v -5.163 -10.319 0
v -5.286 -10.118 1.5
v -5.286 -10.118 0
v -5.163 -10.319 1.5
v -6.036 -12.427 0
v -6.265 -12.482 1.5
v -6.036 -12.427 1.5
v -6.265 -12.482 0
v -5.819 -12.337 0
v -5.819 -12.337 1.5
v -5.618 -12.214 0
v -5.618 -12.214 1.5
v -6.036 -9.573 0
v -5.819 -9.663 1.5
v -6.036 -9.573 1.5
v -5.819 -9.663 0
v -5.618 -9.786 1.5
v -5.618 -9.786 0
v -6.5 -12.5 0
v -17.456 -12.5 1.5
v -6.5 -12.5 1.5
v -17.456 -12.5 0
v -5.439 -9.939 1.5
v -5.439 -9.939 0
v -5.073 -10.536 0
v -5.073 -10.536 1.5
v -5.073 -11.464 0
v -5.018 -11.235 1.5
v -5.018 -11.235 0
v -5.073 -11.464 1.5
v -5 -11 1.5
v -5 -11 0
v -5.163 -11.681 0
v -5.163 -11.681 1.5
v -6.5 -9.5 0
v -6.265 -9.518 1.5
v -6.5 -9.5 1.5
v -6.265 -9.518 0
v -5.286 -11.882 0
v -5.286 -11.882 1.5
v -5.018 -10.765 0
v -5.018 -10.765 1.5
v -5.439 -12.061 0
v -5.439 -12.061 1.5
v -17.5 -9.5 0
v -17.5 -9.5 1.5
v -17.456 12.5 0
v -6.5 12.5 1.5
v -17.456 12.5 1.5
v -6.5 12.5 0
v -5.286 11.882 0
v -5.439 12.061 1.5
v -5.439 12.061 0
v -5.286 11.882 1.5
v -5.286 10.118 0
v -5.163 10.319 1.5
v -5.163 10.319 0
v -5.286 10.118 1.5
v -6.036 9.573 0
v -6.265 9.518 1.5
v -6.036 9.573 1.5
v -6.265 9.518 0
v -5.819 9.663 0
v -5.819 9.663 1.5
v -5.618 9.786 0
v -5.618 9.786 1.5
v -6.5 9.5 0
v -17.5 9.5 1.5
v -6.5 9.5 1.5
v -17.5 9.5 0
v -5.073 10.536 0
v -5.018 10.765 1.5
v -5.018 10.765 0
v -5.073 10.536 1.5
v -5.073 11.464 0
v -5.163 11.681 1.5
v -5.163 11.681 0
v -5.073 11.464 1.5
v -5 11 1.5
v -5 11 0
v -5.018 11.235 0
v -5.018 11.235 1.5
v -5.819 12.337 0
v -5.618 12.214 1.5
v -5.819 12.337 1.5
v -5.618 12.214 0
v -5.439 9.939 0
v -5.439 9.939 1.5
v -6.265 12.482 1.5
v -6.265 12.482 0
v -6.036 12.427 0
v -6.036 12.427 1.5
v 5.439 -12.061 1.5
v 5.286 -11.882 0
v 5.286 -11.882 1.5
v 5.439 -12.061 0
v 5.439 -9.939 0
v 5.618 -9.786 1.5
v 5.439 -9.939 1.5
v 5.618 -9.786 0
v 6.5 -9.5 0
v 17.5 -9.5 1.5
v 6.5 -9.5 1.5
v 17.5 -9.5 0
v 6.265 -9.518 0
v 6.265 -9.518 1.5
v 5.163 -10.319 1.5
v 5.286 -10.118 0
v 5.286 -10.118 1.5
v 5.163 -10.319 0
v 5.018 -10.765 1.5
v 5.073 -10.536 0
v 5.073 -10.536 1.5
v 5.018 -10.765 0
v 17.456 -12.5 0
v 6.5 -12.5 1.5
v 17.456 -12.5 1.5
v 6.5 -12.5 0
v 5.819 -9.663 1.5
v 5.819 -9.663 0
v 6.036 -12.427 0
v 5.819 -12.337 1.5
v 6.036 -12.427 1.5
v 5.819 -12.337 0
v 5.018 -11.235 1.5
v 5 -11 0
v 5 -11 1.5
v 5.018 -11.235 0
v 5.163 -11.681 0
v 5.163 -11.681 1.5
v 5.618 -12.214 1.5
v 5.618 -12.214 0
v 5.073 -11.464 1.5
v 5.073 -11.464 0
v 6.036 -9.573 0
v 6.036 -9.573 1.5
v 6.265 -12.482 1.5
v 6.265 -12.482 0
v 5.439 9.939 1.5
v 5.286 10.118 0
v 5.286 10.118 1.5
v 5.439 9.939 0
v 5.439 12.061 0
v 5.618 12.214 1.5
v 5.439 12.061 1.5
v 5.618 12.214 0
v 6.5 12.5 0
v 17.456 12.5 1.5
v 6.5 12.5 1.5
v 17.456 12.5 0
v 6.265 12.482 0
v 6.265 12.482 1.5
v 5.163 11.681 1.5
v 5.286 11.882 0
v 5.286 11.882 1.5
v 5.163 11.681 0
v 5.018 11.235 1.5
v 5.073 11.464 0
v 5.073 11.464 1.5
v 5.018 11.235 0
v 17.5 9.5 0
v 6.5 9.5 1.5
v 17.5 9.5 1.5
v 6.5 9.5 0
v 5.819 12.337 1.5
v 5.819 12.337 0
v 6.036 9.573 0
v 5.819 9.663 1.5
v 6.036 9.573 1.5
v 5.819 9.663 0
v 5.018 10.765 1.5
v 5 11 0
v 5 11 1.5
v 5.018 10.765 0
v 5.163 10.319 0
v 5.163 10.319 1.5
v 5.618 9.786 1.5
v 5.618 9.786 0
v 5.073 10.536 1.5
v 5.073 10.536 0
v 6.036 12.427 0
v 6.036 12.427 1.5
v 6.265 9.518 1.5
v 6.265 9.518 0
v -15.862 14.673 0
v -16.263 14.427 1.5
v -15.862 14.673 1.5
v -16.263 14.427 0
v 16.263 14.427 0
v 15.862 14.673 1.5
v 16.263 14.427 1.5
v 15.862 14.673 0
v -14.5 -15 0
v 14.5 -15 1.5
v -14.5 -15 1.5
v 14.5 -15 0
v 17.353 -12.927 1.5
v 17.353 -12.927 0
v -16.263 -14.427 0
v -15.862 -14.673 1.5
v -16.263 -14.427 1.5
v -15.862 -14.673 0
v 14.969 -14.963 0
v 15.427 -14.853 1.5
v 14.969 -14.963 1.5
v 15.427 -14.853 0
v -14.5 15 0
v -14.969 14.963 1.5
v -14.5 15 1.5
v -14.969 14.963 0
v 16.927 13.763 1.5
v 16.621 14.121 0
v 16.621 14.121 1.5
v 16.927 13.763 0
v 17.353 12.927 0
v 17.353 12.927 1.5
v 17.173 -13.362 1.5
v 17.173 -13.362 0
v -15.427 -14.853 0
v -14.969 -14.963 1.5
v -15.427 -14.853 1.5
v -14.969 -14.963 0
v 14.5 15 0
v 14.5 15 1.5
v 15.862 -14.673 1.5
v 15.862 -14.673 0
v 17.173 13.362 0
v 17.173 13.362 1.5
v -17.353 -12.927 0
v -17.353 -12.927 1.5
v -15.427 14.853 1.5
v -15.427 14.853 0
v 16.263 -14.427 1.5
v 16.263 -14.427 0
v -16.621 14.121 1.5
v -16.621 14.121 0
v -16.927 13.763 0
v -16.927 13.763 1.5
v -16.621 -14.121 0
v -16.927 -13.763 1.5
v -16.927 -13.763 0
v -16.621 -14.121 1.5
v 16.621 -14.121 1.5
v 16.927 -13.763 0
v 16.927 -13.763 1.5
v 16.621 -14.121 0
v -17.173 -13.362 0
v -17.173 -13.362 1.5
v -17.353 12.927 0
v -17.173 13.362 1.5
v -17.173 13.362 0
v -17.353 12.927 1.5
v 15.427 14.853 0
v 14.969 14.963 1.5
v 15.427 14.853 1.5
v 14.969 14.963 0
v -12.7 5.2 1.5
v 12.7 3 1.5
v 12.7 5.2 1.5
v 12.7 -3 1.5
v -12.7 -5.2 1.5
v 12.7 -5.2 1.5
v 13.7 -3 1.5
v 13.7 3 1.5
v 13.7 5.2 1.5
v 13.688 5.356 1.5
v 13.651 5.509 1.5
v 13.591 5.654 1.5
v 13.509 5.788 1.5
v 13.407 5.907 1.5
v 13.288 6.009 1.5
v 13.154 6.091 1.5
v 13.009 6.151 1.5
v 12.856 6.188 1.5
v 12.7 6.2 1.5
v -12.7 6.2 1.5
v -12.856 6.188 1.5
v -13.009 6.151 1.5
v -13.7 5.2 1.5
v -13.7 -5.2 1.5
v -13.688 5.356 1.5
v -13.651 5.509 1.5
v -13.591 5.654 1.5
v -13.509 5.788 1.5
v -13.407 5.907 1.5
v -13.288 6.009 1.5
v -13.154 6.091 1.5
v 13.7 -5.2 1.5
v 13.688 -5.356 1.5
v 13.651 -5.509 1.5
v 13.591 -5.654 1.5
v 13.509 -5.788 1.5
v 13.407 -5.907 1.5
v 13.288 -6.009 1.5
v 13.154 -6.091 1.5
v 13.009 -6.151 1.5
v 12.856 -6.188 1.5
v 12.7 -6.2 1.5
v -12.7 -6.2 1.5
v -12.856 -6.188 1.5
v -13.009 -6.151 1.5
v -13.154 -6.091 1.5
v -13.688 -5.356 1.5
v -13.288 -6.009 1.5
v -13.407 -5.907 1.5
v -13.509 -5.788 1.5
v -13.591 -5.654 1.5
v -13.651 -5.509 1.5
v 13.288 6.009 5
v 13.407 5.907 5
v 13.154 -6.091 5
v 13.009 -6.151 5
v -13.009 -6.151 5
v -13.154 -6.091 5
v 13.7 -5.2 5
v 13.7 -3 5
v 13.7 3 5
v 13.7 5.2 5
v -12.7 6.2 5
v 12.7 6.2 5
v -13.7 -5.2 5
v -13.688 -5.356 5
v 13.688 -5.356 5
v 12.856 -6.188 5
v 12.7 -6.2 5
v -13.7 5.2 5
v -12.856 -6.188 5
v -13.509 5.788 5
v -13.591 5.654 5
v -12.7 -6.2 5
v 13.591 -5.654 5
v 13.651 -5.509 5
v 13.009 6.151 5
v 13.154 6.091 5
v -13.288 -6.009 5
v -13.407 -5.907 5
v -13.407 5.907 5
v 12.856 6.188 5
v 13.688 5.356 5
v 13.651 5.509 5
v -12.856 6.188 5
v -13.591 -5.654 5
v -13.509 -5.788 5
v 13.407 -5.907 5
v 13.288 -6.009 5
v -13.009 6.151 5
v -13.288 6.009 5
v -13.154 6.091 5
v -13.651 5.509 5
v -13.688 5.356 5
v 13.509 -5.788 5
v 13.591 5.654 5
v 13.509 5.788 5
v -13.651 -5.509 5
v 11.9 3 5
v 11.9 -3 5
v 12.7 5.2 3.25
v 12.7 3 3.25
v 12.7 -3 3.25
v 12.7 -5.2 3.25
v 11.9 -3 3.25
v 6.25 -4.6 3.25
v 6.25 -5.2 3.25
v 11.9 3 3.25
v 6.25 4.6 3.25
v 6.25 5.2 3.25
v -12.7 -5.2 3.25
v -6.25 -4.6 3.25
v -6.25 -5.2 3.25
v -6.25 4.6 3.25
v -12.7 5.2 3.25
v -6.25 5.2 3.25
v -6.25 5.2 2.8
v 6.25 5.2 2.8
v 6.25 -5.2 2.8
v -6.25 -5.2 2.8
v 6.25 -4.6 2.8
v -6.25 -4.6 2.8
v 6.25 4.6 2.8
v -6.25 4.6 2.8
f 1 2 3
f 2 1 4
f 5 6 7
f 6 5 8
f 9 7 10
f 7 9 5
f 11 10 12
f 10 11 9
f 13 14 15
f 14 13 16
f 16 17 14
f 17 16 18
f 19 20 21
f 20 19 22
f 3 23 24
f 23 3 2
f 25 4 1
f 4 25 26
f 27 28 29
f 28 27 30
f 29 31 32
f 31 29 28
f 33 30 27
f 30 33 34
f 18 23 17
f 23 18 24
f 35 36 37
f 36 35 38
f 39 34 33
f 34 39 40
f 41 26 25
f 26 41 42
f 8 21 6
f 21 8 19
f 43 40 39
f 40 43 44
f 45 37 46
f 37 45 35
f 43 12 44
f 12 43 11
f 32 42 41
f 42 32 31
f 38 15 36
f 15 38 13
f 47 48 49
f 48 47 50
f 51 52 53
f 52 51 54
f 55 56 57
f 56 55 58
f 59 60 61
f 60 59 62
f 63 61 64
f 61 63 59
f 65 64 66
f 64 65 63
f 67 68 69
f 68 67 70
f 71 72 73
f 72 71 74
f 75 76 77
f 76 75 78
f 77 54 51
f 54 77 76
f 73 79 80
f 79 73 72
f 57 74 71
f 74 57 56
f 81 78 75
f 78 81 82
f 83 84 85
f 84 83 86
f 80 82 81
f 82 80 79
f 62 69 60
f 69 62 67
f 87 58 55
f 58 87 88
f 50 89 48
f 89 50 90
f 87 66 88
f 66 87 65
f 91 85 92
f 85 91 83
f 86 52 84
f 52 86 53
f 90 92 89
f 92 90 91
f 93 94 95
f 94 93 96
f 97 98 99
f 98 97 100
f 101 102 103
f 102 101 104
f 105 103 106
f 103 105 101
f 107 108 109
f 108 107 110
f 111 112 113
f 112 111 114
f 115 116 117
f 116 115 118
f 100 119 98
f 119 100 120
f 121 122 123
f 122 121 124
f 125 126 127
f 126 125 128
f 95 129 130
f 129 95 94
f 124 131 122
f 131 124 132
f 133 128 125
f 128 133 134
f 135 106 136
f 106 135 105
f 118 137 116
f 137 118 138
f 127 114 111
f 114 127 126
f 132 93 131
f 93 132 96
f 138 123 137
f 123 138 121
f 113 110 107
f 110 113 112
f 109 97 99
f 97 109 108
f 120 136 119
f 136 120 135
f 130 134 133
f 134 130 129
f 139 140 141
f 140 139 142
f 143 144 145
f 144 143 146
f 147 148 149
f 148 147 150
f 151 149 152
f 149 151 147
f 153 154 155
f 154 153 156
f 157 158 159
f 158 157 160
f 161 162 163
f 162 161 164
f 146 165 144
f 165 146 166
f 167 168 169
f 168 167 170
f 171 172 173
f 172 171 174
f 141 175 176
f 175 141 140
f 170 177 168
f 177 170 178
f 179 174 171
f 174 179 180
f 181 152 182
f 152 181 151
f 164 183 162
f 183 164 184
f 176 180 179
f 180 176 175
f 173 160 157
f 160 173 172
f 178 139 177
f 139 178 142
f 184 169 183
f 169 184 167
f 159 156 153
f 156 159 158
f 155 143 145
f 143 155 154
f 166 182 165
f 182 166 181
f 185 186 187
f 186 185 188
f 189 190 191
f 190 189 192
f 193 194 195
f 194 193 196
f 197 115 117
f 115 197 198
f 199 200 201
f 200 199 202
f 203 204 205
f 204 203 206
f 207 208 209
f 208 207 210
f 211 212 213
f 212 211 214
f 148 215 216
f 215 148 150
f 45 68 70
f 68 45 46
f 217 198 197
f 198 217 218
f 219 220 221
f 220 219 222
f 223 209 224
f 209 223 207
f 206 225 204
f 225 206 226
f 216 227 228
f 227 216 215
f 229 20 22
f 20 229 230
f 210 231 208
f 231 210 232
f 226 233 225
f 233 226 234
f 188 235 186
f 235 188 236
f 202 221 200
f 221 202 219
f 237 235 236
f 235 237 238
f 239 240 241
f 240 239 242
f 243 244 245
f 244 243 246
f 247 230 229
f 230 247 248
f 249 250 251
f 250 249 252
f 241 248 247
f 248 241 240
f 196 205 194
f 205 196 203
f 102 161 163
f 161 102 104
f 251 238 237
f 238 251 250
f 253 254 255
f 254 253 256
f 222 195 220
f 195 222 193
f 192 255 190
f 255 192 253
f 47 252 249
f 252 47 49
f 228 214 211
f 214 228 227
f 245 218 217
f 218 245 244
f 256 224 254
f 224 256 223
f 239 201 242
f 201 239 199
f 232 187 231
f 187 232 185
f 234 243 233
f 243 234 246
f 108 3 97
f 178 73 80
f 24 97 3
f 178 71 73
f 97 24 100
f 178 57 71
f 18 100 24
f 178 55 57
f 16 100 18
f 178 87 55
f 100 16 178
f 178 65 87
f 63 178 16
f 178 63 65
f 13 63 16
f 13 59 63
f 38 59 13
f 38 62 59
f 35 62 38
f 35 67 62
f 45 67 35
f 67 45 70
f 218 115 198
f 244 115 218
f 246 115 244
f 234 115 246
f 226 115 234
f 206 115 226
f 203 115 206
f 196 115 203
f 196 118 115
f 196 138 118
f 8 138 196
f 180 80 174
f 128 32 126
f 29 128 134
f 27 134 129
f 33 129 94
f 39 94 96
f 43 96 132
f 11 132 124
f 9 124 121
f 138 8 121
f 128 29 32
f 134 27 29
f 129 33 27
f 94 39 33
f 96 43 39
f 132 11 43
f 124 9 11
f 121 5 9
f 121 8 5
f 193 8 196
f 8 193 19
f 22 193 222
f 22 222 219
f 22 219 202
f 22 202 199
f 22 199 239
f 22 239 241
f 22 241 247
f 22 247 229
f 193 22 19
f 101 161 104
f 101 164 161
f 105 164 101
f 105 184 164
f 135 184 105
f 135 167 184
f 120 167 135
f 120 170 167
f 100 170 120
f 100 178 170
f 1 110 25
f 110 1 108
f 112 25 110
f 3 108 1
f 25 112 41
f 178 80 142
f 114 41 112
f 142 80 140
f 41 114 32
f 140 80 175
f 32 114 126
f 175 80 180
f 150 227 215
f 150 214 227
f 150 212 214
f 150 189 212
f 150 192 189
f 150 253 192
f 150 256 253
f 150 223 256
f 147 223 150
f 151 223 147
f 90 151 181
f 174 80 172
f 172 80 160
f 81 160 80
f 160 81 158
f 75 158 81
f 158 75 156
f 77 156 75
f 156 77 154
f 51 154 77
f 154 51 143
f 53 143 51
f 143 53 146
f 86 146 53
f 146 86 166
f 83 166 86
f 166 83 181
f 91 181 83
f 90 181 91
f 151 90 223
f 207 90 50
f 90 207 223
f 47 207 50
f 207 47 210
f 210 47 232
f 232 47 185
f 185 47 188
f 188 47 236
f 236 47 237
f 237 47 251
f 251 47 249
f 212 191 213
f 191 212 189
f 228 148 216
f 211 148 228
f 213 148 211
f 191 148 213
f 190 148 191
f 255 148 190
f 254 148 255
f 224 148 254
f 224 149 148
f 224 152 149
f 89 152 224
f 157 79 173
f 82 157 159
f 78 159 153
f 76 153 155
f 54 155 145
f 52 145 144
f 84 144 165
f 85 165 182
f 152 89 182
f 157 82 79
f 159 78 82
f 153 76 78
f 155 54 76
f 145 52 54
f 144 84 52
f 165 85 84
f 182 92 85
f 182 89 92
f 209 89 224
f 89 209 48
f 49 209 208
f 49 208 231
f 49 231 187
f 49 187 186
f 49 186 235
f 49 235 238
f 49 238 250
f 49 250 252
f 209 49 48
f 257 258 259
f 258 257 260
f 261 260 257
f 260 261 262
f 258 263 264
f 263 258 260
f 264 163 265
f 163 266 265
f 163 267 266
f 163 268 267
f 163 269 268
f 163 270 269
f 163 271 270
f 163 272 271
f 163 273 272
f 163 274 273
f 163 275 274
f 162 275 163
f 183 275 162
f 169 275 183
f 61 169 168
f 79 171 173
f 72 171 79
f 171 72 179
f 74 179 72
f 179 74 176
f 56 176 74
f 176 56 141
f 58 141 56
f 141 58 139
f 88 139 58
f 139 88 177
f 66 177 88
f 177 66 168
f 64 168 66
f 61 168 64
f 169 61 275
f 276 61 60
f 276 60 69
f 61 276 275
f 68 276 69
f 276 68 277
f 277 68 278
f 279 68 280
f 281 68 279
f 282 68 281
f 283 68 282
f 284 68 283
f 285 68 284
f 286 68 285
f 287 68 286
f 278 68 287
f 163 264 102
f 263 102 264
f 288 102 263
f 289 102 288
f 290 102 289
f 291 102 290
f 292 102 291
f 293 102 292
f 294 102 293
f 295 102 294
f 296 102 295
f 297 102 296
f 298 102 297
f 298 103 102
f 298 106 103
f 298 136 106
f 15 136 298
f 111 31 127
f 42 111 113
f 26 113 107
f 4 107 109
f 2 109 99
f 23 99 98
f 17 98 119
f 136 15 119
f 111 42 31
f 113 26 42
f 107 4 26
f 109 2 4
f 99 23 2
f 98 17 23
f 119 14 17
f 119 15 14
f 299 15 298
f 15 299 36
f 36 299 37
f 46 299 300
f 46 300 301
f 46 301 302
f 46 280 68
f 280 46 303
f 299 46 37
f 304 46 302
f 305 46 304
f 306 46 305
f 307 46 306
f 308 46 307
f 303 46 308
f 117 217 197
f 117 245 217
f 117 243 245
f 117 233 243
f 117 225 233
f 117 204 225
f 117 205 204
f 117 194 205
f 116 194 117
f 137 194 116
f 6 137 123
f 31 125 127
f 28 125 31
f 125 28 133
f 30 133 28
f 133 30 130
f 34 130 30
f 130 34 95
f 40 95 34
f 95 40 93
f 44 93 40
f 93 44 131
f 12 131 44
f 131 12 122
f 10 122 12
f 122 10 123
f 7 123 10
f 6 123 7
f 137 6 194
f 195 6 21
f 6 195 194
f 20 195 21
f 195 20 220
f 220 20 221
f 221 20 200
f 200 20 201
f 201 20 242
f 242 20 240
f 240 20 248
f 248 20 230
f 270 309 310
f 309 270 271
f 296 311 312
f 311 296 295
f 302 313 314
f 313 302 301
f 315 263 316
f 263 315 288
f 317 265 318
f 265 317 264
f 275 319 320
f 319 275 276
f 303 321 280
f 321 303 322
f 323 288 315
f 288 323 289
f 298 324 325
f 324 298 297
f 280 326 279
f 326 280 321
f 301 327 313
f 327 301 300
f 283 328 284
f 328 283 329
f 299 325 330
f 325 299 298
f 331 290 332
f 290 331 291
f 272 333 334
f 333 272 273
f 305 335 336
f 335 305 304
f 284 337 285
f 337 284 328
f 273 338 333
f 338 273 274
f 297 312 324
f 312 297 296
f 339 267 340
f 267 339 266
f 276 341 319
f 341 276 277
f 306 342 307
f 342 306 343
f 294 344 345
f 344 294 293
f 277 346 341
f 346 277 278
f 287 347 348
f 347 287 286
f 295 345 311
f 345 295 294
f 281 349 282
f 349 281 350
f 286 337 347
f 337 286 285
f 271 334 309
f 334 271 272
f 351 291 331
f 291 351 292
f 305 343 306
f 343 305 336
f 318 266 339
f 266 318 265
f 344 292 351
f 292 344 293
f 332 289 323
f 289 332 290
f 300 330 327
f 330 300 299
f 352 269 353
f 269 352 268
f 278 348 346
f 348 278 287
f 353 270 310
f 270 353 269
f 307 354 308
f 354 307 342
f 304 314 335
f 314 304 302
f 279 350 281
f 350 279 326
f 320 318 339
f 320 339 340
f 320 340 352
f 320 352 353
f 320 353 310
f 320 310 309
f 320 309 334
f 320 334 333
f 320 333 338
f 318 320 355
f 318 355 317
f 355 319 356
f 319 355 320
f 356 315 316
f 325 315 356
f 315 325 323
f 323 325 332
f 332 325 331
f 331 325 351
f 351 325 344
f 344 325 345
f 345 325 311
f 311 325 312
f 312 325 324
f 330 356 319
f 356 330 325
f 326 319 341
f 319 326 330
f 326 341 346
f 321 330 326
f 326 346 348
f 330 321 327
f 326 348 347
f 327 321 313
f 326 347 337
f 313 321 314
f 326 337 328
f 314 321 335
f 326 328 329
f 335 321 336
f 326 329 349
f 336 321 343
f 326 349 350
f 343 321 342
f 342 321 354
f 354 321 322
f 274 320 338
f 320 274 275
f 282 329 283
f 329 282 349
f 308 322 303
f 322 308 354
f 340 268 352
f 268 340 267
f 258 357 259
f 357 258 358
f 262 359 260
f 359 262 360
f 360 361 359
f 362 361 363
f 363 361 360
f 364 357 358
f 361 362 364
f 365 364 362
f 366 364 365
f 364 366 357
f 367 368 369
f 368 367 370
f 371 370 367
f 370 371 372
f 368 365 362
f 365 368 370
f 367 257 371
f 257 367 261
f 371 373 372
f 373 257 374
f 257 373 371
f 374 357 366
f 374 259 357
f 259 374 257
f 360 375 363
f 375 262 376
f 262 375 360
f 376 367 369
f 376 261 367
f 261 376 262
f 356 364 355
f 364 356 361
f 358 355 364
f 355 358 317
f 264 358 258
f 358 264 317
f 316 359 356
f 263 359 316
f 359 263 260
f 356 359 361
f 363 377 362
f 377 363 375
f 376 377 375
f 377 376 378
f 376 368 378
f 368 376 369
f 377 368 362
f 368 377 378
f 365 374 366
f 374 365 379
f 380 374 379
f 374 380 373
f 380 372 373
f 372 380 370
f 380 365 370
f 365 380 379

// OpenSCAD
// EMG Sensor Clip for BioAmp Candy
// Snap-fit bracket with sleeve attachment base
//
// Parameters — adjust for fit
board_length = 25;      // BioAmp Candy length (mm)
board_width = 10;       // BioAmp Candy width (mm)
board_thickness = 1.6;  // PCB thickness (mm)
wall = 1.2;             // Wall thickness (mm)
clip_height = 5;        // Total clip height above sleeve (mm)
base_width = 30;        // Base footprint width (mm)
base_length = 35;       // Base footprint length (mm)
base_thickness = 1.5;   // Base plate thickness (mm)
slot_width = 3;         // Sewing/velcro slot width (mm)
slot_length = 12;       // Sewing/velcro slot length (mm)
lip = 0.6;              // Snap-fit lip overhang (mm)
$fn = 40;

module base_plate() {
    difference() {
        // Rounded rectangle base
        hull() {
            for (x = [-base_length/2 + 3, base_length/2 - 3])
                for (y = [-base_width/2 + 3, base_width/2 - 3])
                    translate([x, y, 0])
                        cylinder(r=3, h=base_thickness);
        }

        // Sewing/velcro attachment slots (4 corners)
        for (x = [-base_length/2 + 5, base_length/2 - 5])
            for (y = [-base_width/2 + 4, base_width/2 - 4])
                translate([x, y, -0.1])
                    hull() {
                        translate([-slot_length/2, 0, 0])
                            cylinder(r=slot_width/2, h=base_thickness + 0.2);
                        translate([slot_length/2, 0, 0])
                            cylinder(r=slot_width/2, h=base_thickness + 0.2);
                    }
    }
}

module clip_walls() {
    cradle_h = clip_height - base_thickness;

    translate([0, 0, base_thickness]) {
        difference() {
            // Outer walls
            hull() {
                for (x = [-(board_length/2 + wall), (board_length/2 + wall)])
                    for (y = [-(board_width/2 + wall), (board_width/2 + wall)])
                        translate([x > 0 ? x - 1 : x + 1, y > 0 ? y - 1 : y + 1, 0])
                            cylinder(r=1, h=cradle_h);
            }

            // Inner cavity
            translate([0, 0, -0.1])
                cube([board_length + 0.4, board_width + 0.4, cradle_h + 0.2], center=true);

            // Cable exit slot (one short end)
            translate([board_length/2 + wall, 0, cradle_h/2])
                cube([wall * 3, board_width * 0.6, cradle_h + 0.2], center=true);
        }

        // Snap-fit lips (inward bumps to hold PCB)
        for (y = [-(board_width/2 + 0.2), (board_width/2 + 0.2 - lip)])
            translate([-board_length/4, y, cradle_h - board_thickness - lip])
                cube([board_length/2, lip, lip]);
    }
}

// Assemble
base_plate();
clip_walls();
